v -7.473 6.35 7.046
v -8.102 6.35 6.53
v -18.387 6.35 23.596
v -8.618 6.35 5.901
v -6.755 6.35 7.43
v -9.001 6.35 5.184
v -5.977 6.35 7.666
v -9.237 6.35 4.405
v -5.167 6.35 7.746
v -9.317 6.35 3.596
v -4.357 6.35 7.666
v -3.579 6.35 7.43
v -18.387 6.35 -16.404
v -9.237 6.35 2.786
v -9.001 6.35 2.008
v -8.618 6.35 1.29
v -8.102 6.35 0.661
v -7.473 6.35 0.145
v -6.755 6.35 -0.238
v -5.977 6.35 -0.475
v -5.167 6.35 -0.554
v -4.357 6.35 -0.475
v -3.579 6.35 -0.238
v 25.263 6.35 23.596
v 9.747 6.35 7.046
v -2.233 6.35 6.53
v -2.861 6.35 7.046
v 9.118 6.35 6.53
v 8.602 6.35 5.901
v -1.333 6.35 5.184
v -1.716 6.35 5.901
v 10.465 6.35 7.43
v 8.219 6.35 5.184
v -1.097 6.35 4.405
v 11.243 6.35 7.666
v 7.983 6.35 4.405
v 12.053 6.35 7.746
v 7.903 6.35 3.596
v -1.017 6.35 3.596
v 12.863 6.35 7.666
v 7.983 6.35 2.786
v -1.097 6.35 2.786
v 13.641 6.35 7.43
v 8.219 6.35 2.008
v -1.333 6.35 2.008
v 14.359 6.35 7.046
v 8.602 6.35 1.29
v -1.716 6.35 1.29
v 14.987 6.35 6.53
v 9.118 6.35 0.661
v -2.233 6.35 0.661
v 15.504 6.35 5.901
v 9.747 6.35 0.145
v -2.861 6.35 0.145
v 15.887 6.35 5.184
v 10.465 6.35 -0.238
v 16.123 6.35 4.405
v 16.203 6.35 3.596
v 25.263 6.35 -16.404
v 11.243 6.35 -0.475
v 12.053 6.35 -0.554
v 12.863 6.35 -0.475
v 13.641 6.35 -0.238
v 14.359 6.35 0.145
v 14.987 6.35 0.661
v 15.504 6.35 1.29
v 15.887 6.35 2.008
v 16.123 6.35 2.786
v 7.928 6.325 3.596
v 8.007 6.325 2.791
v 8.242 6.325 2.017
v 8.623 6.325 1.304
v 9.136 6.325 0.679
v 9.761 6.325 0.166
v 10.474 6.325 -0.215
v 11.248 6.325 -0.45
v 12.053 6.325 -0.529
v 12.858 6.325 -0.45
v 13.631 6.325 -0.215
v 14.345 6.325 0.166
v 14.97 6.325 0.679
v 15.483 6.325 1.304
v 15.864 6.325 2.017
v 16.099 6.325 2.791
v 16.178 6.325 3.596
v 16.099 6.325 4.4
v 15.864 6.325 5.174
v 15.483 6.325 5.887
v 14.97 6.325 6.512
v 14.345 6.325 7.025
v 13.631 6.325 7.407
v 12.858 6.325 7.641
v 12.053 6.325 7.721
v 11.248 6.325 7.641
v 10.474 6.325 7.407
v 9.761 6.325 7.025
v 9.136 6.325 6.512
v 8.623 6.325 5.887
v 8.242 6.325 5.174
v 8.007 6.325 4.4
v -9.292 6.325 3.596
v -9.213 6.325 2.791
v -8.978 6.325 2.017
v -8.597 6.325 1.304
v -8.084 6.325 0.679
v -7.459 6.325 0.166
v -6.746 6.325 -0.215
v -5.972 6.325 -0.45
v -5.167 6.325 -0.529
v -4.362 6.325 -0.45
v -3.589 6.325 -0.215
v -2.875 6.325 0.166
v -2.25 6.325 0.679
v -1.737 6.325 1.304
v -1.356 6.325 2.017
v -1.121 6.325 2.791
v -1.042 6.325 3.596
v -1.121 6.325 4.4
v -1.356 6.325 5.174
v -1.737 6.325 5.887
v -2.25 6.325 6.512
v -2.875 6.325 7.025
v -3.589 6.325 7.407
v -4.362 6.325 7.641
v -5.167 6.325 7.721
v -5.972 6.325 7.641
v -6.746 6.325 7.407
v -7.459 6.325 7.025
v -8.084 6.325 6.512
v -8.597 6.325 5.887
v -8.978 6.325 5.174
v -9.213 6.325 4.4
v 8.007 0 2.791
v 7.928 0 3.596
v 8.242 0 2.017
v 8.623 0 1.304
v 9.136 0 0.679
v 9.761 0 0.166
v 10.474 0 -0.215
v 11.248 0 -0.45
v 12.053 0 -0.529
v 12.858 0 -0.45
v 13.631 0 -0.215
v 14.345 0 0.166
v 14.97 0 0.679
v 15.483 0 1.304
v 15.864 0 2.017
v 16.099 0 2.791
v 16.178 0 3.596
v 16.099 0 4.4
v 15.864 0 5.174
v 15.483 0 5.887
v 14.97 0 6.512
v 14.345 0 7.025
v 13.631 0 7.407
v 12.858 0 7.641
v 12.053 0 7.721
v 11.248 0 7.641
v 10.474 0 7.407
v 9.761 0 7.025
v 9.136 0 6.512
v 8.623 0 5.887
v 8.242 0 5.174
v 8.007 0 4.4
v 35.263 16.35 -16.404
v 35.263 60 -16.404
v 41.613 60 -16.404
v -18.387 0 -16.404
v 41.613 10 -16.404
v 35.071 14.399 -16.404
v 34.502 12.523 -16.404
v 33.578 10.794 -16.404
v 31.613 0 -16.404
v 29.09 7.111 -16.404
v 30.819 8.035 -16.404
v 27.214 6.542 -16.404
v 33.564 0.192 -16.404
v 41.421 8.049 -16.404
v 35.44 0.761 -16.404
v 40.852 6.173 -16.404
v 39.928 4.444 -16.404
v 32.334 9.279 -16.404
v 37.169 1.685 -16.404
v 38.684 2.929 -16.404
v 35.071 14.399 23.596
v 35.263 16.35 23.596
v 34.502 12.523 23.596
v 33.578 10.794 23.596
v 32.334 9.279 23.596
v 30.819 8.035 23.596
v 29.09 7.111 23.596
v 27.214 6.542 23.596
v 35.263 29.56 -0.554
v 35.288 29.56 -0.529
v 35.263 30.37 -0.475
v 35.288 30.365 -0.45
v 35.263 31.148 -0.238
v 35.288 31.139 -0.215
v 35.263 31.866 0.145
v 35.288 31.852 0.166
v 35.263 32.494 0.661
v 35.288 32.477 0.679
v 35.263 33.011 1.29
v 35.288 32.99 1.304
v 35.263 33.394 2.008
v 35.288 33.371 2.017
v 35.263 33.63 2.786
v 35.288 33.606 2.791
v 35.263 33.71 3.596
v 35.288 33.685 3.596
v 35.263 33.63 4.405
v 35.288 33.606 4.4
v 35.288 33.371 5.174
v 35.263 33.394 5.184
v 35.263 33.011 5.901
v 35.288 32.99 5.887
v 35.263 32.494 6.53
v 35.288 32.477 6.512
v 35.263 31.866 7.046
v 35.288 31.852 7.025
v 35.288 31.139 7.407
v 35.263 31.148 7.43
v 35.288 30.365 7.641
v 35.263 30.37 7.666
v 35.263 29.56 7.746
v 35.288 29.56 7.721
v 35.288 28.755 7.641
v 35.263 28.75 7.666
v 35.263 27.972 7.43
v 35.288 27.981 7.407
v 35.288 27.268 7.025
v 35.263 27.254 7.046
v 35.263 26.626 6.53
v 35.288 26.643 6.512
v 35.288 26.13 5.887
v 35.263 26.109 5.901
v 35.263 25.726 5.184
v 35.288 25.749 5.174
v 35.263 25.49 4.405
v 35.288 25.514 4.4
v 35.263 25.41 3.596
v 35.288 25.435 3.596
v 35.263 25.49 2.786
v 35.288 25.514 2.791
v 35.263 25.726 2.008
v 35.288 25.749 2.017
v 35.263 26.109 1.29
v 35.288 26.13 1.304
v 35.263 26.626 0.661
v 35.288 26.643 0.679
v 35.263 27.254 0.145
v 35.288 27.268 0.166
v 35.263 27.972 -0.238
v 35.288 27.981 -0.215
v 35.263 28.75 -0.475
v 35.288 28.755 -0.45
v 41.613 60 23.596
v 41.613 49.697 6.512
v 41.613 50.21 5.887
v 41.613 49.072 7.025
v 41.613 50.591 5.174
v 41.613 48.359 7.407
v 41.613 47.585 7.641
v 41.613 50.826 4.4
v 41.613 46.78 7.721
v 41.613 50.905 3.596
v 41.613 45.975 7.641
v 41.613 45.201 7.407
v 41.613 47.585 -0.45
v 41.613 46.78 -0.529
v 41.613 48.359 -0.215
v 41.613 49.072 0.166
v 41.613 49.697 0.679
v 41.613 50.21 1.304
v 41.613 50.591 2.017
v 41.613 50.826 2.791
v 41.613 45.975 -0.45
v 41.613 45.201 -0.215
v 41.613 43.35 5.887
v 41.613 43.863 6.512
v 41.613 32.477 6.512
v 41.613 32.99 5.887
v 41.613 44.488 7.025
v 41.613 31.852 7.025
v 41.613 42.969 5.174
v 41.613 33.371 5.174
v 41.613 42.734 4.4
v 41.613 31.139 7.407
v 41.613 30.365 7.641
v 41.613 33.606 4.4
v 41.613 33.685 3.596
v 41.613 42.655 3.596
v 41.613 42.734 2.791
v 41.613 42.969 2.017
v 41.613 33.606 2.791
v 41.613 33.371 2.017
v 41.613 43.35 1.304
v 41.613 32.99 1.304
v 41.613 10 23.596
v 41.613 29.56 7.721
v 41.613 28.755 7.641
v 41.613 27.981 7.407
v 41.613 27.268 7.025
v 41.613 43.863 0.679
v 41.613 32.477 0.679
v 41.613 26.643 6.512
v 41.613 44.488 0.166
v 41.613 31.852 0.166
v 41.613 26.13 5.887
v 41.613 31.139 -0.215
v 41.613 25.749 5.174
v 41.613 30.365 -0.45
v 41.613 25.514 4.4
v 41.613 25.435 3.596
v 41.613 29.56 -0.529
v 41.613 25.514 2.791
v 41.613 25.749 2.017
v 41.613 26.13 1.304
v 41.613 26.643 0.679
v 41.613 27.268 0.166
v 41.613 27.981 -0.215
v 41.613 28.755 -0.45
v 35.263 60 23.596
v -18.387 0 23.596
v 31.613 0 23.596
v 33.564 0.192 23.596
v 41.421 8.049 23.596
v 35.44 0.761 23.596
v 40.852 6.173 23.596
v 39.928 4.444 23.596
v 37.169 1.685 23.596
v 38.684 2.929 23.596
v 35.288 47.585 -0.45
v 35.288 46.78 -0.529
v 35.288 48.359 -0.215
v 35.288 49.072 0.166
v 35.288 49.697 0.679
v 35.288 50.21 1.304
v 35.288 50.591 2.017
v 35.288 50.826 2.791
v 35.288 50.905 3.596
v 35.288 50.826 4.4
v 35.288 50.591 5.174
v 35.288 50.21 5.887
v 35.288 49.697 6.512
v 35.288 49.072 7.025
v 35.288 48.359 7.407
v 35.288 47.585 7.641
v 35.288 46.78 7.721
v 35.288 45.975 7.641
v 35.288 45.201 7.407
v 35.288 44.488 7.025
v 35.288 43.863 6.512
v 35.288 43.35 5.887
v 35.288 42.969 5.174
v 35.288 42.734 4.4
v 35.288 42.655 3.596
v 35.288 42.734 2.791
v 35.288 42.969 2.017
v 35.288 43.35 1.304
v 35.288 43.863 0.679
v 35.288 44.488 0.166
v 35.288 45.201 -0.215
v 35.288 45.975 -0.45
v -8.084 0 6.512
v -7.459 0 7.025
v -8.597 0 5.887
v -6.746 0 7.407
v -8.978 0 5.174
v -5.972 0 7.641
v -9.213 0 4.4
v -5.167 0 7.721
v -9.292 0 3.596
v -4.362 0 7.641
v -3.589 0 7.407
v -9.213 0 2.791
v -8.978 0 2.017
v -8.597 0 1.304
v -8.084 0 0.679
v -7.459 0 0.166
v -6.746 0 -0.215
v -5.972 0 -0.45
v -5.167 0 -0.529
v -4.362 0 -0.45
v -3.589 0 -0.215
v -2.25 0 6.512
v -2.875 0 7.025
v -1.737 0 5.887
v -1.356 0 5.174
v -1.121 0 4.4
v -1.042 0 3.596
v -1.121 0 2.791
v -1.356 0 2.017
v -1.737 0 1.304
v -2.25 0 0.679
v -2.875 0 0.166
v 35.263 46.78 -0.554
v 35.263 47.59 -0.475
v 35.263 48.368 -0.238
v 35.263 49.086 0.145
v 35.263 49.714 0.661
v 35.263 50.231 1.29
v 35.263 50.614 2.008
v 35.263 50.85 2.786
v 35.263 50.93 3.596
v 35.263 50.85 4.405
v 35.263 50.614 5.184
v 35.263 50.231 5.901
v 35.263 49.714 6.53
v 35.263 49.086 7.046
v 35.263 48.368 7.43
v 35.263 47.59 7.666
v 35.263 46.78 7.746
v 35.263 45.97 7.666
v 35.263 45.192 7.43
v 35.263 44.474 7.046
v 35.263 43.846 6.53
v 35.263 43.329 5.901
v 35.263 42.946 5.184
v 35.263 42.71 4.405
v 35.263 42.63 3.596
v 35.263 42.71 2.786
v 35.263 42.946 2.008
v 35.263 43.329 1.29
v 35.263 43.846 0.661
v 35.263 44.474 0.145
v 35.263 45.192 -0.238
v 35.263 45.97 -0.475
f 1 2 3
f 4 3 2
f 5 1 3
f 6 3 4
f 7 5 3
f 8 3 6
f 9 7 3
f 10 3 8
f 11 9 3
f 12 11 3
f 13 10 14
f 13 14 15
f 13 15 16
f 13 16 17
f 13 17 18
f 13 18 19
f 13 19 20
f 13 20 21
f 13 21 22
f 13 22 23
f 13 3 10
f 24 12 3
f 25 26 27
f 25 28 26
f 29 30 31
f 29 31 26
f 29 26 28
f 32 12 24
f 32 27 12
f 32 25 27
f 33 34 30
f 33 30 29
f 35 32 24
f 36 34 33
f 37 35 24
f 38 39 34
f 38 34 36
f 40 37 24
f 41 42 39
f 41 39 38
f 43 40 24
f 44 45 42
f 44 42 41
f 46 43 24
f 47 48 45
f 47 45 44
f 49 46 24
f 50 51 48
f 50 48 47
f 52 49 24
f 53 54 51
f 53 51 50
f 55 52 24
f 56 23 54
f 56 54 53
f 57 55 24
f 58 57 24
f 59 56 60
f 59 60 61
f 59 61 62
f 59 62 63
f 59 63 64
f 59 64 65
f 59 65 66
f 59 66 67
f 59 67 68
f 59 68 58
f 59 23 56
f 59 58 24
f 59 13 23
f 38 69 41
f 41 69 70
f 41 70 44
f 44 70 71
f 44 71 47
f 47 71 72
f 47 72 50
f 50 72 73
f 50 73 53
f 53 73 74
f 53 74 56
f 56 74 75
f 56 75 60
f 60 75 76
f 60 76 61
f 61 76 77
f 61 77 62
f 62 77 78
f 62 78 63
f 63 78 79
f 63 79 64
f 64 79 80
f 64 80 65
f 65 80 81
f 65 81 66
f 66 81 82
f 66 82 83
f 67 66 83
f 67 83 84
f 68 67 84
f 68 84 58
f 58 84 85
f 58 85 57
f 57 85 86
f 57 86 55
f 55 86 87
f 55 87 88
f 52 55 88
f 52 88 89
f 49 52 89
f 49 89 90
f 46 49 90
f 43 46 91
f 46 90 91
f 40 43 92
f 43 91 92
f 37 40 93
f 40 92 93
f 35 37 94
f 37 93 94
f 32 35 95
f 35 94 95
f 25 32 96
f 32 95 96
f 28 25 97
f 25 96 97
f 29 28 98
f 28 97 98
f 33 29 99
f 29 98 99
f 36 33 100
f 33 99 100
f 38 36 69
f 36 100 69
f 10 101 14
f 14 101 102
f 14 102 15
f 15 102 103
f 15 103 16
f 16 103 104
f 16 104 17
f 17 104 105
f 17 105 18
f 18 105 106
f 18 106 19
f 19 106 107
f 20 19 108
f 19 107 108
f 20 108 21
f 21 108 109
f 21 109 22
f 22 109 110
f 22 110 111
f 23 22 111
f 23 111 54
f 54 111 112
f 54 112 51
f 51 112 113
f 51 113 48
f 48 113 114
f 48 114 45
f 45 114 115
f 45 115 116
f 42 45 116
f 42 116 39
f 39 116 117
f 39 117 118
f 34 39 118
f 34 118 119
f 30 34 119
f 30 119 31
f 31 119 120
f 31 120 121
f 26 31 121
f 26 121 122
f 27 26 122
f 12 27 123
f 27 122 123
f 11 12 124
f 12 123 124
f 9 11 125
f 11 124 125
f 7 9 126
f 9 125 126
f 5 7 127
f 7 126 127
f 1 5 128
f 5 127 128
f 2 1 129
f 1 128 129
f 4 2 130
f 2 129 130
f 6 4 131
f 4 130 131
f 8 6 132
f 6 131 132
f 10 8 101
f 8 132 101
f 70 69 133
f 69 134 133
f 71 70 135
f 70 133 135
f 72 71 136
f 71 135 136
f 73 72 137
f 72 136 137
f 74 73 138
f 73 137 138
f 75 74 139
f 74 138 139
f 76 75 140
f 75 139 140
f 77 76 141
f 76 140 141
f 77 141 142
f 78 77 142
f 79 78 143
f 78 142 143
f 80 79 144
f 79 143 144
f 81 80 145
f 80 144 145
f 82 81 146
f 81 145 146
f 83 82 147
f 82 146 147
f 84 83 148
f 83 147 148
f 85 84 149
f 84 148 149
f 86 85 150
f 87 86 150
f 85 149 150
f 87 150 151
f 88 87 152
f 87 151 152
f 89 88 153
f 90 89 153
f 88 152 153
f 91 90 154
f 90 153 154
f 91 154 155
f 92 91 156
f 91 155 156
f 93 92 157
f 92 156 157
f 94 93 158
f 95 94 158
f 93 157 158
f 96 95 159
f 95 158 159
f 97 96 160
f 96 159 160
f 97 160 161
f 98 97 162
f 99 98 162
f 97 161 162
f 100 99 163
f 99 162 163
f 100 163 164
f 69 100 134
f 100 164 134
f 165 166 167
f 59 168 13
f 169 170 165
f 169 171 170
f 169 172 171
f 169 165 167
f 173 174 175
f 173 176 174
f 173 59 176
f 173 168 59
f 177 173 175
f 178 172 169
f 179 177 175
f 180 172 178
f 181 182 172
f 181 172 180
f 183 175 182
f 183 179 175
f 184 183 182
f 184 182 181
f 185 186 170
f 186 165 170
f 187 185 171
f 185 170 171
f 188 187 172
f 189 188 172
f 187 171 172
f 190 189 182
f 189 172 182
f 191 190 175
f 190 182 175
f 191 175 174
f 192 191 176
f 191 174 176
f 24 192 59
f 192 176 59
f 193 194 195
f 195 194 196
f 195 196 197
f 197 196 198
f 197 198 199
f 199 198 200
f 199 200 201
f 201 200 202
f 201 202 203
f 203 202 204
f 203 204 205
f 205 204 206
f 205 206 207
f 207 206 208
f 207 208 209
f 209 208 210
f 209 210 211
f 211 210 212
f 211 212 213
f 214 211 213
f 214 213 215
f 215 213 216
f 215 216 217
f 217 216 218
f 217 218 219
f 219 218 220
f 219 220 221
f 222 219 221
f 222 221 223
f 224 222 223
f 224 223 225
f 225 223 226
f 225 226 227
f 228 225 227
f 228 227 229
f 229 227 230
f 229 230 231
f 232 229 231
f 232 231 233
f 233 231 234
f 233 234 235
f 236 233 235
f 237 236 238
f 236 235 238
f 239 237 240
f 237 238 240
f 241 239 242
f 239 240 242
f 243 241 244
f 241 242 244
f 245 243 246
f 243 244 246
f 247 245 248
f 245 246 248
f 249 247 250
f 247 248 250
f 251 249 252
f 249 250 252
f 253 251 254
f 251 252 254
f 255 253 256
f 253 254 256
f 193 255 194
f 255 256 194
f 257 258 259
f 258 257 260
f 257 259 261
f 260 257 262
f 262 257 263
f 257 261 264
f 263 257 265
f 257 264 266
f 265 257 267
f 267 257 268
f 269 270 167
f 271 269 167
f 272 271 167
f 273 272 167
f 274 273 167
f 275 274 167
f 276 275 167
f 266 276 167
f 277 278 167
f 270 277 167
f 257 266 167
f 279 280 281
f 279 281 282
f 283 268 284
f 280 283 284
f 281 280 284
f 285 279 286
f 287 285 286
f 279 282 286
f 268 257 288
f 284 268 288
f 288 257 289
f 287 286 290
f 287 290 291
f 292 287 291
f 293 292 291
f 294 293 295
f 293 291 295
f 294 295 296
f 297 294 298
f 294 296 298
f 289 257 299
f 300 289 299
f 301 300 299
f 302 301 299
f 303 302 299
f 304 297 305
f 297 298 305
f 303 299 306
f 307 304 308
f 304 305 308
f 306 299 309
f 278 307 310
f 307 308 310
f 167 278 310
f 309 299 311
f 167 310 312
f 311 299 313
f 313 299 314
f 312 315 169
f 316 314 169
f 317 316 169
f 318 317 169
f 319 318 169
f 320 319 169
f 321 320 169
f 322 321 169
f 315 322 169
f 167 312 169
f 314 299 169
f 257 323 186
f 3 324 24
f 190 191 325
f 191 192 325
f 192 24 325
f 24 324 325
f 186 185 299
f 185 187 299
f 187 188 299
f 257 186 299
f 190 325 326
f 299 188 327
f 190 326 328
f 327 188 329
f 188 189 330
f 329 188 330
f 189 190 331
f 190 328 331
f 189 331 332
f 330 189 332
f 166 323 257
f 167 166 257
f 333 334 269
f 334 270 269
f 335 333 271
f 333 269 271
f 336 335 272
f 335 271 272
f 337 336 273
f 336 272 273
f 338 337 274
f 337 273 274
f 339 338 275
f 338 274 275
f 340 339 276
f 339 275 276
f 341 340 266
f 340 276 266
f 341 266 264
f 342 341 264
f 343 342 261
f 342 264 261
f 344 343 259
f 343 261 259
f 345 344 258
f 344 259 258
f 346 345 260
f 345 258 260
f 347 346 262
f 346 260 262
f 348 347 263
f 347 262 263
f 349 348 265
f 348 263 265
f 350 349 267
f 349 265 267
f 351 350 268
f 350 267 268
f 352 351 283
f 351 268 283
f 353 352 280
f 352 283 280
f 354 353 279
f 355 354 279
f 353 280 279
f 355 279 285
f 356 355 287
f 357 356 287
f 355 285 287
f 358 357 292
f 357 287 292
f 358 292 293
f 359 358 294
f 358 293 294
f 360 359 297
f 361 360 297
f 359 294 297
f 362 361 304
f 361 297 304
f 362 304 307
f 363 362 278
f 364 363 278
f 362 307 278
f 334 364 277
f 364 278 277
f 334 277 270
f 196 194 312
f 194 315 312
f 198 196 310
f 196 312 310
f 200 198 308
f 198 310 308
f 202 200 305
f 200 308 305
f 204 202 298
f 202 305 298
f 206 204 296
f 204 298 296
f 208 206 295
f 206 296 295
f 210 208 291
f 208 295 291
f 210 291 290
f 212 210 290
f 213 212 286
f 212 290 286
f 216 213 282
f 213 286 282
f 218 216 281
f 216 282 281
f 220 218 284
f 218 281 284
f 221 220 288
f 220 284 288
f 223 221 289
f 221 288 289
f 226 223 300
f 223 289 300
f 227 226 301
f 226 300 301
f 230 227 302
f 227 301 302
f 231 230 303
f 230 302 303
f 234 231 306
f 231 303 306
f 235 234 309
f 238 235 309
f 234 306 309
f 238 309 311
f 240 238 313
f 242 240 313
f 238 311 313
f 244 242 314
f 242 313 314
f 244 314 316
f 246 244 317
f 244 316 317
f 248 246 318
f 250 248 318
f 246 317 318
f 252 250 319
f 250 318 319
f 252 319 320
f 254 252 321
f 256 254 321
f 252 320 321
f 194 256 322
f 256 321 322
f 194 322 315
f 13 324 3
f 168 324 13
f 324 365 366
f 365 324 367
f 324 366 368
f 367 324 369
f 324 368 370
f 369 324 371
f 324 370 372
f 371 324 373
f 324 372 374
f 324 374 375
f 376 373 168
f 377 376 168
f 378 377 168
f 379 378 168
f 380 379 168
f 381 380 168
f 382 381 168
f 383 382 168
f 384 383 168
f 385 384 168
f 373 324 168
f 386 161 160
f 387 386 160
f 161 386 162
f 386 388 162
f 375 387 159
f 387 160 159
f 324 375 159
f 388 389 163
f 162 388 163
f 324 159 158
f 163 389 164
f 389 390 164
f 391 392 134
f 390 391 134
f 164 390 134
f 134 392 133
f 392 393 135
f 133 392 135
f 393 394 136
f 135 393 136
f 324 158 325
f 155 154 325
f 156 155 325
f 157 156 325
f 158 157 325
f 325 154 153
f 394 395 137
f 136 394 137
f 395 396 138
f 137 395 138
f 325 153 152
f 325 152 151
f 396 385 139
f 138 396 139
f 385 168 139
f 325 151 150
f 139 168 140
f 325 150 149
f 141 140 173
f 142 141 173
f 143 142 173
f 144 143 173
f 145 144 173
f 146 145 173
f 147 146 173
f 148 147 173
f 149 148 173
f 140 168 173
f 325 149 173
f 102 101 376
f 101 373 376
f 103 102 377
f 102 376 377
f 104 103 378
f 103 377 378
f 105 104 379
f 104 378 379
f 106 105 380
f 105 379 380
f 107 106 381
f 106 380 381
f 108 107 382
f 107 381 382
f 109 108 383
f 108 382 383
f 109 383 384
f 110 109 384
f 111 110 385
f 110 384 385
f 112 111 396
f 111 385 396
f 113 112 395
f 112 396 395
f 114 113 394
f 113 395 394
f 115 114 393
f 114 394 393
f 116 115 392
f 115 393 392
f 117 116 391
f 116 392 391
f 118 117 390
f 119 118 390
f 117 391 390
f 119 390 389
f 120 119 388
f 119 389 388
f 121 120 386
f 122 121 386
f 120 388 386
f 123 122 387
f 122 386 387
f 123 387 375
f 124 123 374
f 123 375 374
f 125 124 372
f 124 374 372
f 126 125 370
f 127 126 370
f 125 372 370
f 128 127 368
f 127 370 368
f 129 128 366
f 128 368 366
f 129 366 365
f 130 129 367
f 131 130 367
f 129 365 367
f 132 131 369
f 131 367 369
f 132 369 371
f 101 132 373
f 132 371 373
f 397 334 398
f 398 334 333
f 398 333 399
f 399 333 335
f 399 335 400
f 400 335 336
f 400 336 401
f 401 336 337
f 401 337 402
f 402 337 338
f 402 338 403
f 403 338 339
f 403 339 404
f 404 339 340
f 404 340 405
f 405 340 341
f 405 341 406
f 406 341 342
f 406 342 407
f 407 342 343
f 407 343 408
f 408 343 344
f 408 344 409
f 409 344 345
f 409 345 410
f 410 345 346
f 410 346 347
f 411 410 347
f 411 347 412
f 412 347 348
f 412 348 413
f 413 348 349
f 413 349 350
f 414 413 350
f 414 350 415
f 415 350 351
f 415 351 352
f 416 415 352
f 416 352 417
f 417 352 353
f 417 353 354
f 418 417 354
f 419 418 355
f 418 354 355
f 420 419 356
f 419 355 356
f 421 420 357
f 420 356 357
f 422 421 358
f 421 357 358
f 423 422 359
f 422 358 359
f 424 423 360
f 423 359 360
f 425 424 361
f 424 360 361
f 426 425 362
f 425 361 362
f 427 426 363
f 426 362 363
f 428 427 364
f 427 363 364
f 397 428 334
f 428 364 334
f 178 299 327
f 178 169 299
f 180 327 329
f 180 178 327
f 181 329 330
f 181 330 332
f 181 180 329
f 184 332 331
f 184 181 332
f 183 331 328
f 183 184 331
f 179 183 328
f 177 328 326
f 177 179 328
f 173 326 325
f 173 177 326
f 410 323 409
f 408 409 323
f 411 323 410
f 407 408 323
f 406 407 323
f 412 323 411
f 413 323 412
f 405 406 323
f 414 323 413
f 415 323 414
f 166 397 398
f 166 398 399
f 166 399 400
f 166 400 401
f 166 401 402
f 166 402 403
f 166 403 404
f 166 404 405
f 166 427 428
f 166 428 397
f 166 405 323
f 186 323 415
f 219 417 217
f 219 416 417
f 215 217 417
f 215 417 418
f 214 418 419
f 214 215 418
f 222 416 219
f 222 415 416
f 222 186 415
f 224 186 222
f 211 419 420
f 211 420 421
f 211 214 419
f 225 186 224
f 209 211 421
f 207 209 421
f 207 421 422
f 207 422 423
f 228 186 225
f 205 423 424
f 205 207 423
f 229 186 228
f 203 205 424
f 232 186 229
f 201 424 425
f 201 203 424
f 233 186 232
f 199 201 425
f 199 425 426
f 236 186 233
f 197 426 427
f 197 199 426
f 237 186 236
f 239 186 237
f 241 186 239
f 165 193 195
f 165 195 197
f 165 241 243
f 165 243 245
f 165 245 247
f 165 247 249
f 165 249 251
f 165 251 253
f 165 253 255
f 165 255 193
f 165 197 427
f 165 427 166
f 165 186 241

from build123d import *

# Parameters (mm, degrees)
SKETCH1_W                              = 60
SKETCH1_H                              = 40
BOSS_EXTRUDE1_DEPTH                    = 6.35
SKETCH2_W                              = 6.35
SKETCH2_H                              = 40
BOSS_EXTRUDE2_DEPTH                    = 53.65
FILLET4_R                              = 10
FILLET5_R                              = 10
TAP_DRILL_FOR_M8_HELICOIL1_D           = 8.25
TAP_DRILL_FOR_M8_HELICOIL1_CSINK_D     = 8.3
TAP_DRILL_FOR_M8_HELICOIL1_CSINK_ANGLE = 90
TAP_DRILL_FOR_M8_HELICOIL2_D           = 8.25
TAP_DRILL_FOR_M8_HELICOIL2_CSINK_D     = 8.3
TAP_DRILL_FOR_M8_HELICOIL2_CSINK_ANGLE = 90


with BuildPart() as part:
    # Sketch1 → Boss-Extrude1 (new body)
    with BuildSketch(Plane(origin=(0, 0, 0), x_dir=(1, 0, 0), z_dir=(0, 1, 0))):
        with Locations((11.612905022, -3.595670031)):
            Rectangle(SKETCH1_W, SKETCH1_H)
    extrude(amount=BOSS_EXTRUDE1_DEPTH)

    # Sketch2 → Boss-Extrude2 (add)
    with BuildSketch(Plane(origin=(0, 6.35, 0), x_dir=(1, 0, 0), z_dir=(0, 1, 0))):
        with Locations((38.437905022, -3.595670031)):
            Rectangle(SKETCH2_W, SKETCH2_H)
    extrude(amount=BOSS_EXTRUDE2_DEPTH)

    # Fillet4
    fillet4_edges = [part.edges().sort_by_distance(p)[0] for p in [
        (35.262905022, 6.35, 3.595670031),
    ]]
    fillet(fillet4_edges, radius=FILLET4_R)

    # Fillet5
    fillet5_edges = [part.edges().sort_by_distance(p)[0] for p in [
        (41.612905022, 0, 3.595670031),
    ]]
    fillet(fillet5_edges, radius=FILLET5_R)

    # Tap Drill for M8 Helicoil1 (through all)
    with Locations(Plane(origin=(0, 6.35, 0), x_dir=(1, 0, 0), z_dir=(0, 1, 0))):
        with Locations((12.052905022, -3.595670031), (-5.167094978, -3.595670031)):
            CounterSinkHole(TAP_DRILL_FOR_M8_HELICOIL1_D / 2, TAP_DRILL_FOR_M8_HELICOIL1_CSINK_D / 2, counter_sink_angle=TAP_DRILL_FOR_M8_HELICOIL1_CSINK_ANGLE)

    # Tap Drill for M8 Helicoil2 (through all)
    with Locations(Plane.ZY.offset(-35.262905022)):
        with Locations((3.595670031, 46.78), (3.595670031, 29.56)):
            CounterSinkHole(TAP_DRILL_FOR_M8_HELICOIL2_D / 2, TAP_DRILL_FOR_M8_HELICOIL2_CSINK_D / 2, counter_sink_angle=TAP_DRILL_FOR_M8_HELICOIL2_CSINK_ANGLE)


solid = part.part
